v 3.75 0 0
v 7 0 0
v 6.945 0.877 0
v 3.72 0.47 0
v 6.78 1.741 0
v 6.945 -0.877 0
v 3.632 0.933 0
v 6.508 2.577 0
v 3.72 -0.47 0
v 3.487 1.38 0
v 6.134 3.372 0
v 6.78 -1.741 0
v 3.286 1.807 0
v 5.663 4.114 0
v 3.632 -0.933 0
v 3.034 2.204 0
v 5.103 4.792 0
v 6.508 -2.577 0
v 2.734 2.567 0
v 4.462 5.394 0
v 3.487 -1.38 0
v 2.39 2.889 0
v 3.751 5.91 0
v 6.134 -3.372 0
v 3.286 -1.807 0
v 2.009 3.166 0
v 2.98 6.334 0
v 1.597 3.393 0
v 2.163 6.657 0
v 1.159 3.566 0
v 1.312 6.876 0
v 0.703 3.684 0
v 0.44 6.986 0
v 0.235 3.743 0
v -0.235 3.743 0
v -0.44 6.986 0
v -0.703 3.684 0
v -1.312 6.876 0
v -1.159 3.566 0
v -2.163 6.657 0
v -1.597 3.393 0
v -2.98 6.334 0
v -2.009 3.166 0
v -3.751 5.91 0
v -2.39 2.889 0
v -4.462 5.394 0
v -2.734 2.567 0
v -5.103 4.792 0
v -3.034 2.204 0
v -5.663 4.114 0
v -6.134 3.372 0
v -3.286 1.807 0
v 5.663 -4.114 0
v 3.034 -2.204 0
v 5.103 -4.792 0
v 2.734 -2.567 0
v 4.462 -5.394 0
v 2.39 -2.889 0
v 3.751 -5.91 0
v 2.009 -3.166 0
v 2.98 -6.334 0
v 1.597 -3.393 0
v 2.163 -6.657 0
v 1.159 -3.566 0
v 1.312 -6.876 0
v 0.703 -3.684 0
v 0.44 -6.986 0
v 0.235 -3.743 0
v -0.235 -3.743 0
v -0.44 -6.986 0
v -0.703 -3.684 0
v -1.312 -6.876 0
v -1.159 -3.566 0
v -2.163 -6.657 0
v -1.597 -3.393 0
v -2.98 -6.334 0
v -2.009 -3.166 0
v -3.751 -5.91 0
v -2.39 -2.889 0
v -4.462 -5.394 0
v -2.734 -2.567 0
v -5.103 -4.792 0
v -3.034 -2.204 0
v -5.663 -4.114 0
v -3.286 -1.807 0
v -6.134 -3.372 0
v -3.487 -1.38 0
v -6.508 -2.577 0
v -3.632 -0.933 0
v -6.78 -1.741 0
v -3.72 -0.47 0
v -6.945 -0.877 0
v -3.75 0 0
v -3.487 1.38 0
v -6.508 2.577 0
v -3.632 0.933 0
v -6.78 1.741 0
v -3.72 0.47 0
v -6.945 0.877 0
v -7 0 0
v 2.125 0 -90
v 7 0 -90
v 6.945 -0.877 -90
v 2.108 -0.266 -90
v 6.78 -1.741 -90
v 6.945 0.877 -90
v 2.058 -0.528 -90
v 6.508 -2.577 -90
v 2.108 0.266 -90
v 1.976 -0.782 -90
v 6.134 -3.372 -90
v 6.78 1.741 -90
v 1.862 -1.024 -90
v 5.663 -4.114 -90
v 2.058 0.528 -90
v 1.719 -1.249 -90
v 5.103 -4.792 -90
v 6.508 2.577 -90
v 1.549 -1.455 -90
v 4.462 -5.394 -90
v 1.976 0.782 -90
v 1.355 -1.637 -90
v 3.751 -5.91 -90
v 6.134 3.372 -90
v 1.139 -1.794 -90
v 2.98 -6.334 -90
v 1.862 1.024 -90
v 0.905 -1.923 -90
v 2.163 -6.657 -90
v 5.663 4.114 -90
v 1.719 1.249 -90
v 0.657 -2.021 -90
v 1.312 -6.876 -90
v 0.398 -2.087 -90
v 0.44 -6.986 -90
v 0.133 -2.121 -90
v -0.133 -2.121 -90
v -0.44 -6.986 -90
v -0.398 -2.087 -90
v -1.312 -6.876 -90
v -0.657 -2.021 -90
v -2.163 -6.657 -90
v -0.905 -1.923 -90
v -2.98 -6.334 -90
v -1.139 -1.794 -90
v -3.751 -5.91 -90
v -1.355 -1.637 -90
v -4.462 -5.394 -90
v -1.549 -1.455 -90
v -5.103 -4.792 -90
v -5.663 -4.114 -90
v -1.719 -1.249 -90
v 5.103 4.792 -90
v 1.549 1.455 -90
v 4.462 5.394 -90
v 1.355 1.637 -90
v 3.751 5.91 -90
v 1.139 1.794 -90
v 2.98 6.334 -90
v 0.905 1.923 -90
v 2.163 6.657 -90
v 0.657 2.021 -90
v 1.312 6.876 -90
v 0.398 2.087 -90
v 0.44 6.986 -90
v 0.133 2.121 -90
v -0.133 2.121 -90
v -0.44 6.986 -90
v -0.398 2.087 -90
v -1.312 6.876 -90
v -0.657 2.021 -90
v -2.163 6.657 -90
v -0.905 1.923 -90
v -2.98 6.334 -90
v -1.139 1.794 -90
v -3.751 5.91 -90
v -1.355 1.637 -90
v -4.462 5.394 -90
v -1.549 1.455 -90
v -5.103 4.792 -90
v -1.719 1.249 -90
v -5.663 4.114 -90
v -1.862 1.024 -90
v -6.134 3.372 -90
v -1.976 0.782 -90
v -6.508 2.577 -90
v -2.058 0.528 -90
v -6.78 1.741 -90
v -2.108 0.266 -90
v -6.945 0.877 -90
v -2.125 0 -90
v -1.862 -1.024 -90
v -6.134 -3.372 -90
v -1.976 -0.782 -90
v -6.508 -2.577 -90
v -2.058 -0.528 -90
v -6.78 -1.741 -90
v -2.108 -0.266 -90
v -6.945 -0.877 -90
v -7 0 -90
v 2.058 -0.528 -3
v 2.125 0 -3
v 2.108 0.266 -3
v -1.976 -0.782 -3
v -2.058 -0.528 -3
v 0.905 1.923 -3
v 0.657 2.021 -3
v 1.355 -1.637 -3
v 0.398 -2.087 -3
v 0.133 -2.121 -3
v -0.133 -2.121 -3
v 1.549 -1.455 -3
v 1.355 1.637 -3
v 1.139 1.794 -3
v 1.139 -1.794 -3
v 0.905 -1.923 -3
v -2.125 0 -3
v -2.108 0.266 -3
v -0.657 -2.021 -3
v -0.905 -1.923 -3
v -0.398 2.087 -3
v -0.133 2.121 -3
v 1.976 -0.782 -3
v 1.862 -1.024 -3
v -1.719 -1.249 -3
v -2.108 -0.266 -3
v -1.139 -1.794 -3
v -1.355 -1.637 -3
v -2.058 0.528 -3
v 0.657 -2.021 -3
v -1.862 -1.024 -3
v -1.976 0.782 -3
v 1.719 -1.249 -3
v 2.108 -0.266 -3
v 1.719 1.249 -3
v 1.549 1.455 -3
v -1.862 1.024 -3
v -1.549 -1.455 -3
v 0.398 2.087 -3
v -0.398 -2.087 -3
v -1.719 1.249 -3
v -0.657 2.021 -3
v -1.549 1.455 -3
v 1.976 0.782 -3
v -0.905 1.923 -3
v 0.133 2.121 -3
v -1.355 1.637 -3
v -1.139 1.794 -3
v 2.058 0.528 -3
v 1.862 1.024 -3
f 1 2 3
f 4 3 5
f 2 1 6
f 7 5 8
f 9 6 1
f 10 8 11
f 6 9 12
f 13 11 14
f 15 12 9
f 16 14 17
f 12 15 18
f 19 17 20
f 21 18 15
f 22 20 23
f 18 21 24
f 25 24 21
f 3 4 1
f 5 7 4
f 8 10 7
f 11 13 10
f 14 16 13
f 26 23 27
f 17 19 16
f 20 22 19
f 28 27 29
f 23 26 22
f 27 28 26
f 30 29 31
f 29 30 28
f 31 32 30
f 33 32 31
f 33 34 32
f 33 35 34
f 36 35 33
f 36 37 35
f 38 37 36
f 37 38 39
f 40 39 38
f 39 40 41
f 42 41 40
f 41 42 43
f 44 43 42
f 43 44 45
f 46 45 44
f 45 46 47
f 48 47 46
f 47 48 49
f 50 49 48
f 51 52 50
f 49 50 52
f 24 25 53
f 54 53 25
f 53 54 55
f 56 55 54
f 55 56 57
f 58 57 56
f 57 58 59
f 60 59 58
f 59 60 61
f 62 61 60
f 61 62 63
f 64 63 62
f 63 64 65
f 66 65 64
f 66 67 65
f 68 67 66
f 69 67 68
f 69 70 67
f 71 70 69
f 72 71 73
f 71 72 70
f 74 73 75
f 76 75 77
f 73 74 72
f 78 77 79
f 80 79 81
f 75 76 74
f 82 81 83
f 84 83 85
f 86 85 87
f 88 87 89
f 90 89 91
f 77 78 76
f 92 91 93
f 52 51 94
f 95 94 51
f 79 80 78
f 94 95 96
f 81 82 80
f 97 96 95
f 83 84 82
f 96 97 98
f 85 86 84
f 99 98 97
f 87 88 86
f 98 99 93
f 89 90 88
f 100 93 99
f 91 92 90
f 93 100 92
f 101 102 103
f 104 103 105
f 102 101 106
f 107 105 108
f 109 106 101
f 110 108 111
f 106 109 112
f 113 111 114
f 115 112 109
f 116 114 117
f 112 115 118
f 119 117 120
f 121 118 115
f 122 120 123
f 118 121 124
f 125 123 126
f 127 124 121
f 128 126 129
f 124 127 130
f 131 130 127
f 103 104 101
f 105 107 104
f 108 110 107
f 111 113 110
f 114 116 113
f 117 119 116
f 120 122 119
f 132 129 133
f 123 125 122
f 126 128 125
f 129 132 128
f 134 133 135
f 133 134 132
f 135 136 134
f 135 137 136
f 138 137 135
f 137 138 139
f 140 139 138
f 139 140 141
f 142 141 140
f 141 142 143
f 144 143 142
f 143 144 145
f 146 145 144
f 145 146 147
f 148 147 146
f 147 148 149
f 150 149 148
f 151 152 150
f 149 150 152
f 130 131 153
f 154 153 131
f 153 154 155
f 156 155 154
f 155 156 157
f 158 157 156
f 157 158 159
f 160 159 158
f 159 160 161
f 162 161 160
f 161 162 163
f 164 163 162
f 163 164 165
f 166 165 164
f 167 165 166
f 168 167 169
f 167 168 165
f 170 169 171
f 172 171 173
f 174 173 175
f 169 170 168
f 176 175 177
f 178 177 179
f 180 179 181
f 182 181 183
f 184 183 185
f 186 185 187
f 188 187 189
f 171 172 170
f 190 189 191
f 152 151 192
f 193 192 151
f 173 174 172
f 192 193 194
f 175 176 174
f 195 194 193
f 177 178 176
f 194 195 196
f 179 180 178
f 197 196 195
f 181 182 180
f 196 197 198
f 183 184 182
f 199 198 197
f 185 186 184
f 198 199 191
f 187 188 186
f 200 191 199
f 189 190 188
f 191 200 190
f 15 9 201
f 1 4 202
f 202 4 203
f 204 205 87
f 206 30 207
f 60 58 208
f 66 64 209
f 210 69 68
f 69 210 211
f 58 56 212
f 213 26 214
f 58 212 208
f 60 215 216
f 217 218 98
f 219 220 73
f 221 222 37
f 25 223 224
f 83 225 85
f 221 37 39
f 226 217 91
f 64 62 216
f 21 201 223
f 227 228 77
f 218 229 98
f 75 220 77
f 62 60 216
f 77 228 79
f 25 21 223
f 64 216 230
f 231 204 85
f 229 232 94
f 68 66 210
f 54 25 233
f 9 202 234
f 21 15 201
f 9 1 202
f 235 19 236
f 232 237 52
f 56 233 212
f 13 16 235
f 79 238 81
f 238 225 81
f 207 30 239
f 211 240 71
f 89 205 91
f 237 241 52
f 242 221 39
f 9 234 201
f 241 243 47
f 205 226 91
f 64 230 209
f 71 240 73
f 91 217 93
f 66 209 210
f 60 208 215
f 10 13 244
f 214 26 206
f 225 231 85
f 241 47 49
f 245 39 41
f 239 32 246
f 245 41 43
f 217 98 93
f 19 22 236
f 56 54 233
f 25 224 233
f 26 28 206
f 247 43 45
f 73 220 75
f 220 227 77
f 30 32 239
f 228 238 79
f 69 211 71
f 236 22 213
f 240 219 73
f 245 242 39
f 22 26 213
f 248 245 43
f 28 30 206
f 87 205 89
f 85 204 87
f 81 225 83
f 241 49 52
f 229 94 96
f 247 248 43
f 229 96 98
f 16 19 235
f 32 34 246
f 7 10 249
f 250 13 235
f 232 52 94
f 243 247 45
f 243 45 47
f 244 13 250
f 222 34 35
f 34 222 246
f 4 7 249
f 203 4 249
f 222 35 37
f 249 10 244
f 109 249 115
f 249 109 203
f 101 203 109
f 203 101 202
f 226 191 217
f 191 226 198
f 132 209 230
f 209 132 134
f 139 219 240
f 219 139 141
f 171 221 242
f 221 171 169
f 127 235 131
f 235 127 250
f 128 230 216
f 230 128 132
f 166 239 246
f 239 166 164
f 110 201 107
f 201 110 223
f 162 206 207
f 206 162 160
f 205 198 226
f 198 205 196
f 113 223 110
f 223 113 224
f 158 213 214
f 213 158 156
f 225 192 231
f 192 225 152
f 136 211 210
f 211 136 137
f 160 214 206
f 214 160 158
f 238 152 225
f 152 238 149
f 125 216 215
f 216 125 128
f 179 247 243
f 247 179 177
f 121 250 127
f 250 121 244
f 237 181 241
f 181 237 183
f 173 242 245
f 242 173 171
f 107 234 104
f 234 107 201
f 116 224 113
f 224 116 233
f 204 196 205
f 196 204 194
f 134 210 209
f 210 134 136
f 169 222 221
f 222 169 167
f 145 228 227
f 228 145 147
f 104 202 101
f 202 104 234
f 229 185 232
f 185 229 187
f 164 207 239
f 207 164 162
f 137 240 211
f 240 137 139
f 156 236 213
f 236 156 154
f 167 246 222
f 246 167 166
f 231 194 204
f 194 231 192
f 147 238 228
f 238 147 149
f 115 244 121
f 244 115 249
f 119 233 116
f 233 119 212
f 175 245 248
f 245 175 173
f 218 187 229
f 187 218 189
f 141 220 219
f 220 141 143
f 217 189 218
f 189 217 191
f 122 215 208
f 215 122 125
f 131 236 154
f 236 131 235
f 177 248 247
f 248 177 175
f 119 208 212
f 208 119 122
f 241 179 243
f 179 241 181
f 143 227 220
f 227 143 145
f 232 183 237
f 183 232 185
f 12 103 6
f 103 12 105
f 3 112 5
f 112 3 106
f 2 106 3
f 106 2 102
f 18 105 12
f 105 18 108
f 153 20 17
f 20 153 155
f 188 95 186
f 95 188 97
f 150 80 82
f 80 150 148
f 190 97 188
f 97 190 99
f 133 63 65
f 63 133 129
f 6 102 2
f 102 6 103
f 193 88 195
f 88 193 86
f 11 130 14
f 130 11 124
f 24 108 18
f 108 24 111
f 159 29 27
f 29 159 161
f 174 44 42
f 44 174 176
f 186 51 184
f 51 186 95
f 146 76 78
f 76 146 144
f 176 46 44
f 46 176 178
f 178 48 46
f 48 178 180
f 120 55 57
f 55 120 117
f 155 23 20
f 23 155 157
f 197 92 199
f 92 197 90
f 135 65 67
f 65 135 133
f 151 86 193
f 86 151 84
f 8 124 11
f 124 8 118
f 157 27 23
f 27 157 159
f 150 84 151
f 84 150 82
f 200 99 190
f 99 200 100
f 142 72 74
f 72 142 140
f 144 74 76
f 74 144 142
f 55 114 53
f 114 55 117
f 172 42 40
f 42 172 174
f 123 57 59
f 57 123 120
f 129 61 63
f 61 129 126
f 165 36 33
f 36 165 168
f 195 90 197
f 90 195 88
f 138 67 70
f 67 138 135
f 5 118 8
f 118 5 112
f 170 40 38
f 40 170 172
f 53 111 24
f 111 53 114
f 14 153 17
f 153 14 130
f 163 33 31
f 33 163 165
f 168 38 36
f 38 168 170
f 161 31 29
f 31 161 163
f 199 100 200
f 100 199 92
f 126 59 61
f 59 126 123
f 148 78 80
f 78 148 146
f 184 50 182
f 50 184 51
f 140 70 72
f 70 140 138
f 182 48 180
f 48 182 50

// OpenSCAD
$fn = 50;


difference() {
	union() {
		translate(v = [0, 0, -90.0000000000]) {
			cylinder(h = 90, r = 7.0000000000);
		}
		cylinder(h = 0, r = 16.0000000000);
	}
	union() {
		translate(v = [0, 0, 0]) {
			rotate(a = [0, 0, 0]) {
				difference() {
					union() {
						#translate(v = [0, 0, -90.0000000000]) {
							cylinder(h = 90, r = 2.0000000000);
						}
						#translate(v = [0, 0, -3]) {
							cylinder(h = 3, r1 = 2.1250000000, r2 = 3.7500000000);
						}
						#translate(v = [0, 0, -90.0000000000]) {
							cylinder(h = 90, r = 2.1250000000);
						}
						#translate(v = [0, 0, -90.0000000000]) {
							cylinder(h = 90, r = 2.0000000000);
						}
					}
					union();
				}
			}
		}
	}
}
